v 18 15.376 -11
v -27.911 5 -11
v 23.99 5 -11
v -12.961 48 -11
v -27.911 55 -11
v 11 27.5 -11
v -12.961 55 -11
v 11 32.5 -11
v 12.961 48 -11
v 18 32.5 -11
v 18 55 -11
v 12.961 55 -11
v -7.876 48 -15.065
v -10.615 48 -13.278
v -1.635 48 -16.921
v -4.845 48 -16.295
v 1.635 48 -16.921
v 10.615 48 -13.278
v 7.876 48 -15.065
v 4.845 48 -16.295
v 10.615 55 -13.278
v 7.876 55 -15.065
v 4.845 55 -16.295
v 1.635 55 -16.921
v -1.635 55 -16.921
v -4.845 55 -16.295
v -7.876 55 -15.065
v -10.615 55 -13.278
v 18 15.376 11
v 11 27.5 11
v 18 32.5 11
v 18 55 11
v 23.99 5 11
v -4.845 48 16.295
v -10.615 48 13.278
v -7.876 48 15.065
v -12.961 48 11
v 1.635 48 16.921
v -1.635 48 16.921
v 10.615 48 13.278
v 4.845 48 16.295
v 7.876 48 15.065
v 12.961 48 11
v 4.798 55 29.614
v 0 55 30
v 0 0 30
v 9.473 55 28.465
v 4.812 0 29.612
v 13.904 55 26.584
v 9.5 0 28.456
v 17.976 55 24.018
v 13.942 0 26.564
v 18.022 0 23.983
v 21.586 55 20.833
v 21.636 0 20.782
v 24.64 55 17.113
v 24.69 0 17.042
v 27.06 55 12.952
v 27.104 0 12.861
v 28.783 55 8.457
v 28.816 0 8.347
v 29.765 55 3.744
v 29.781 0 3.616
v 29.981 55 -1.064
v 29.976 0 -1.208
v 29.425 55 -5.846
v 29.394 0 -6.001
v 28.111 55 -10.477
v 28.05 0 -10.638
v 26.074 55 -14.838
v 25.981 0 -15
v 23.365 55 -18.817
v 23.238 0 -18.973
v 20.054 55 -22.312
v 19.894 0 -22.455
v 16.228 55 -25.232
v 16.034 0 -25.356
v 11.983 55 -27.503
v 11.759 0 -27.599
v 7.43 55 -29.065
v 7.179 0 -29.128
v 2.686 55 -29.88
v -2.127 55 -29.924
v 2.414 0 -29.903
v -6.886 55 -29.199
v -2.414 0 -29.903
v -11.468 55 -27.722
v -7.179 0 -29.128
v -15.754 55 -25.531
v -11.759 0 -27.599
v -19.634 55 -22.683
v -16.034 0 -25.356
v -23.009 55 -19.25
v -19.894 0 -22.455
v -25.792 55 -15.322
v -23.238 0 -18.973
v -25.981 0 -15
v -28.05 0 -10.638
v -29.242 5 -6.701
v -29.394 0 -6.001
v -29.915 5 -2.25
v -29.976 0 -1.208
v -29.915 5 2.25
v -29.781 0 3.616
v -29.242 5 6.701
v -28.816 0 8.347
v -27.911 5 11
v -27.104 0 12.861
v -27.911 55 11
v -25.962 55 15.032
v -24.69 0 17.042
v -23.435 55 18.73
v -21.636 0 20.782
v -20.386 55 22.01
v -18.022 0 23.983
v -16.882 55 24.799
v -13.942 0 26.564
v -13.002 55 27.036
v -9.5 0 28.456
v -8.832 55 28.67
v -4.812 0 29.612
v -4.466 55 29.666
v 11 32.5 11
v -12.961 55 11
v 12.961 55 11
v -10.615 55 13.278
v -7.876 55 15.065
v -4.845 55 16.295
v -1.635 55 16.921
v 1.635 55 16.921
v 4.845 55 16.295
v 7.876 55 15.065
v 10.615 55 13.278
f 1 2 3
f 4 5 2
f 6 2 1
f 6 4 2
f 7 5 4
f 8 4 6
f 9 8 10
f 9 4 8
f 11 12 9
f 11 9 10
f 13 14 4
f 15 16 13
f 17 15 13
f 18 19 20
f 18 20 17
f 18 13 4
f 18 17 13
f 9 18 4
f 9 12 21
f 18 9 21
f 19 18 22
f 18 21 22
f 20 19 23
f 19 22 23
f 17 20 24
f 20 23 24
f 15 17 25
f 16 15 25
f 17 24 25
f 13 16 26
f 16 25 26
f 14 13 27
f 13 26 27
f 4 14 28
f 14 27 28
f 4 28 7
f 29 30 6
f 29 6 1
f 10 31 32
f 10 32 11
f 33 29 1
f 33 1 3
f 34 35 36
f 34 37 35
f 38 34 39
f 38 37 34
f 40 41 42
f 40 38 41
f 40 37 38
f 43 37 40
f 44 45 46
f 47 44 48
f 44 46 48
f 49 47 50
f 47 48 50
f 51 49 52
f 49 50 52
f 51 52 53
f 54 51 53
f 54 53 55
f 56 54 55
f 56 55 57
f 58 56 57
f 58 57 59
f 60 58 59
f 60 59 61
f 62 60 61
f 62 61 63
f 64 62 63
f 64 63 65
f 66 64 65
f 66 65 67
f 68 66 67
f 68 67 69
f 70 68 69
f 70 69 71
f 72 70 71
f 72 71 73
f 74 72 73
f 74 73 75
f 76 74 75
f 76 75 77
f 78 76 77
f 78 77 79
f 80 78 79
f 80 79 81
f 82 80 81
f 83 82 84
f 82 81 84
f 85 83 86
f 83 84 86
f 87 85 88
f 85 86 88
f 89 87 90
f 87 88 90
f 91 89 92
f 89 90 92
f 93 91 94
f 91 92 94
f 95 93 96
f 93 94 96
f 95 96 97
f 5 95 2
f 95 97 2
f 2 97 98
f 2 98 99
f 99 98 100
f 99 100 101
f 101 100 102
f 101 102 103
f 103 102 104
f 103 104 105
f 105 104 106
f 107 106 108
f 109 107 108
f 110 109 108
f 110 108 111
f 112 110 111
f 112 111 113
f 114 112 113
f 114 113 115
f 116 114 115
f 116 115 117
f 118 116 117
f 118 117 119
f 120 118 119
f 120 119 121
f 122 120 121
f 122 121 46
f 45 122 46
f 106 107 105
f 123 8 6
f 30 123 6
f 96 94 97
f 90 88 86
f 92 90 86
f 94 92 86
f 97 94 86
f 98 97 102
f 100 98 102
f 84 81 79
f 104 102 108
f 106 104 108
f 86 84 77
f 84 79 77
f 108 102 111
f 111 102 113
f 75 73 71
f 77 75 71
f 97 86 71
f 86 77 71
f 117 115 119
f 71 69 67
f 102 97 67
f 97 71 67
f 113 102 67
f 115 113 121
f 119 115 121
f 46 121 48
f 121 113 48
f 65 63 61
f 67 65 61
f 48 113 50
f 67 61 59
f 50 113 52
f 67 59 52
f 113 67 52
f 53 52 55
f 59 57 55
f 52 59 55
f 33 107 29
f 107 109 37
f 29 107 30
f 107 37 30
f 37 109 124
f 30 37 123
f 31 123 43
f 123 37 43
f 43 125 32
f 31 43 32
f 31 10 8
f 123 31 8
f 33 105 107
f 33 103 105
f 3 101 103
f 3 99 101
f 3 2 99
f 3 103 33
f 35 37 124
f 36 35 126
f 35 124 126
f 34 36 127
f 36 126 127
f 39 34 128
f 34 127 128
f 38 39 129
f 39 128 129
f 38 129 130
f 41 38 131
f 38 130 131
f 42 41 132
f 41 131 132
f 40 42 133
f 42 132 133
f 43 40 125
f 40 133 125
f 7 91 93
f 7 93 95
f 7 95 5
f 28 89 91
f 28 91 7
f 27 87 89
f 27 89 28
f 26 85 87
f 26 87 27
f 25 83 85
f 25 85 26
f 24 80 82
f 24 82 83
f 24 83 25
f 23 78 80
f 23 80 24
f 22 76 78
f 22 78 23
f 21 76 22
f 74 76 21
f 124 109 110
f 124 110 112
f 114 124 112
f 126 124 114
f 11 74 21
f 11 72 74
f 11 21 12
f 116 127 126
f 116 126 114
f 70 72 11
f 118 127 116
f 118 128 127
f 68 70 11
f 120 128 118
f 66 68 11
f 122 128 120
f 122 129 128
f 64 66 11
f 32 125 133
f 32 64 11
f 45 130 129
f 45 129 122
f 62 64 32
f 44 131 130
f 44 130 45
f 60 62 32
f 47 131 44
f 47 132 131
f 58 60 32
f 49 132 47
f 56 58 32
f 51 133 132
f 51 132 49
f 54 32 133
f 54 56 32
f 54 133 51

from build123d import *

# Parameters (mm, degrees)
SKETCH1_R                           = 30
BOSS_EXTRUDE1_DEPTH                 = 55
SKETCH3_R                           = 17
HUB_POCKET_DEPTH                    = 7
SKETCH2_W                           = 53.984190988
SKETCH2_H                           = 22
SERVO_POCKET_DEPTH                  = 50
SERVO_FRONT_MOUNT_REACH             = 71.462
SERVO_FRONT_MOUNT_DIRECTION_2_REACH = 71.462
WIRE_ACCESS_DEPTH                   = 11


with BuildPart() as part:
    # Sketch1 → Boss-Extrude1 (new body)
    with BuildSketch(Plane(origin=(0, 0, 0), x_dir=(1, 0, 0), z_dir=(0, 1, 0))):
        with Locations(Location((0, 0, 0), (0, 0, 270))):
            Circle(SKETCH1_R)
    extrude(amount=BOSS_EXTRUDE1_DEPTH)

    # Sketch3 → hub pocket (cut)
    with BuildSketch(Plane(origin=(0, 55, 0), x_dir=(1, 0, 0), z_dir=(0, 1, 0))):
        with Locations(Location((0, 0, 0), (0, 0, 270))):
            Circle(SKETCH3_R)
    extrude(amount=-HUB_POCKET_DEPTH, mode=Mode.SUBTRACT)

    # Sketch2 → servo pocket (cut)
    with BuildSketch(Plane(origin=(0, 55, 0), x_dir=(1, 0, 0), z_dir=(0, 1, 0))):
        with Locations((-8.992095494, 0)):
            Rectangle(SKETCH2_W, SKETCH2_H)
    extrude(amount=-SERVO_POCKET_DEPTH, mode=Mode.SUBTRACT)

    # Servo front mount: up to this face of the body (flat: up to its plane)
    servo_front_mount_end = Plane(part.part.faces().sort_by_distance((-5.380622048, 28.154550276, -11))[0])
    # Sketch4 → Servo front mount (add, up to the picked face)
    with BuildSketch(Plane.XY, mode=Mode.PRIVATE) as servo_front_mount_sk1:
        Polygon((18, 32.5), (11, 32.5), (11, 27.5), (18, 15.375644347), align=None)
    servo_front_mount_tool1 = split(extrude(servo_front_mount_sk1.sketch, amount=-SERVO_FRONT_MOUNT_REACH, mode=Mode.PRIVATE), bisect_by=servo_front_mount_end, keep=Keep.BOTH, mode=Mode.PRIVATE)
    add(servo_front_mount_tool1.solids().sort_by(Axis((15.139344, 26.415223, 0), (0, 0, -1)))[0])

    # Servo front mount direction 2: up to this face of the body (flat: up to its plane)
    servo_front_mount_direction_2_end = Plane(part.part.faces().sort_by_distance((-5.380622048, 28.154550276, 11))[0])
    # Sketch4 → Servo front mount direction 2 (add, up to the picked face)
    with BuildSketch(Plane.XY, mode=Mode.PRIVATE) as servo_front_mount_direction_2_sk1:
        Polygon((18, 32.5), (11, 32.5), (11, 27.5), (18, 15.375644347), align=None)
    servo_front_mount_direction_2_tool1 = split(extrude(servo_front_mount_direction_2_sk1.sketch, amount=SERVO_FRONT_MOUNT_DIRECTION_2_REACH, mode=Mode.PRIVATE), bisect_by=servo_front_mount_direction_2_end, keep=Keep.BOTH, mode=Mode.PRIVATE)
    add(servo_front_mount_direction_2_tool1.solids().sort_by(Axis((15.139344, 26.415223, 0), (0, 0, 1)))[0])

    # Sketch5 → Wire access (cut, symmetric)
    with BuildSketch(Plane.XY):
        Polygon((18, 15.375644347), (23.990381057, 5), (18, 5), align=None)
    extrude(amount=WIRE_ACCESS_DEPTH, both=True, mode=Mode.SUBTRACT)


solid = part.part
